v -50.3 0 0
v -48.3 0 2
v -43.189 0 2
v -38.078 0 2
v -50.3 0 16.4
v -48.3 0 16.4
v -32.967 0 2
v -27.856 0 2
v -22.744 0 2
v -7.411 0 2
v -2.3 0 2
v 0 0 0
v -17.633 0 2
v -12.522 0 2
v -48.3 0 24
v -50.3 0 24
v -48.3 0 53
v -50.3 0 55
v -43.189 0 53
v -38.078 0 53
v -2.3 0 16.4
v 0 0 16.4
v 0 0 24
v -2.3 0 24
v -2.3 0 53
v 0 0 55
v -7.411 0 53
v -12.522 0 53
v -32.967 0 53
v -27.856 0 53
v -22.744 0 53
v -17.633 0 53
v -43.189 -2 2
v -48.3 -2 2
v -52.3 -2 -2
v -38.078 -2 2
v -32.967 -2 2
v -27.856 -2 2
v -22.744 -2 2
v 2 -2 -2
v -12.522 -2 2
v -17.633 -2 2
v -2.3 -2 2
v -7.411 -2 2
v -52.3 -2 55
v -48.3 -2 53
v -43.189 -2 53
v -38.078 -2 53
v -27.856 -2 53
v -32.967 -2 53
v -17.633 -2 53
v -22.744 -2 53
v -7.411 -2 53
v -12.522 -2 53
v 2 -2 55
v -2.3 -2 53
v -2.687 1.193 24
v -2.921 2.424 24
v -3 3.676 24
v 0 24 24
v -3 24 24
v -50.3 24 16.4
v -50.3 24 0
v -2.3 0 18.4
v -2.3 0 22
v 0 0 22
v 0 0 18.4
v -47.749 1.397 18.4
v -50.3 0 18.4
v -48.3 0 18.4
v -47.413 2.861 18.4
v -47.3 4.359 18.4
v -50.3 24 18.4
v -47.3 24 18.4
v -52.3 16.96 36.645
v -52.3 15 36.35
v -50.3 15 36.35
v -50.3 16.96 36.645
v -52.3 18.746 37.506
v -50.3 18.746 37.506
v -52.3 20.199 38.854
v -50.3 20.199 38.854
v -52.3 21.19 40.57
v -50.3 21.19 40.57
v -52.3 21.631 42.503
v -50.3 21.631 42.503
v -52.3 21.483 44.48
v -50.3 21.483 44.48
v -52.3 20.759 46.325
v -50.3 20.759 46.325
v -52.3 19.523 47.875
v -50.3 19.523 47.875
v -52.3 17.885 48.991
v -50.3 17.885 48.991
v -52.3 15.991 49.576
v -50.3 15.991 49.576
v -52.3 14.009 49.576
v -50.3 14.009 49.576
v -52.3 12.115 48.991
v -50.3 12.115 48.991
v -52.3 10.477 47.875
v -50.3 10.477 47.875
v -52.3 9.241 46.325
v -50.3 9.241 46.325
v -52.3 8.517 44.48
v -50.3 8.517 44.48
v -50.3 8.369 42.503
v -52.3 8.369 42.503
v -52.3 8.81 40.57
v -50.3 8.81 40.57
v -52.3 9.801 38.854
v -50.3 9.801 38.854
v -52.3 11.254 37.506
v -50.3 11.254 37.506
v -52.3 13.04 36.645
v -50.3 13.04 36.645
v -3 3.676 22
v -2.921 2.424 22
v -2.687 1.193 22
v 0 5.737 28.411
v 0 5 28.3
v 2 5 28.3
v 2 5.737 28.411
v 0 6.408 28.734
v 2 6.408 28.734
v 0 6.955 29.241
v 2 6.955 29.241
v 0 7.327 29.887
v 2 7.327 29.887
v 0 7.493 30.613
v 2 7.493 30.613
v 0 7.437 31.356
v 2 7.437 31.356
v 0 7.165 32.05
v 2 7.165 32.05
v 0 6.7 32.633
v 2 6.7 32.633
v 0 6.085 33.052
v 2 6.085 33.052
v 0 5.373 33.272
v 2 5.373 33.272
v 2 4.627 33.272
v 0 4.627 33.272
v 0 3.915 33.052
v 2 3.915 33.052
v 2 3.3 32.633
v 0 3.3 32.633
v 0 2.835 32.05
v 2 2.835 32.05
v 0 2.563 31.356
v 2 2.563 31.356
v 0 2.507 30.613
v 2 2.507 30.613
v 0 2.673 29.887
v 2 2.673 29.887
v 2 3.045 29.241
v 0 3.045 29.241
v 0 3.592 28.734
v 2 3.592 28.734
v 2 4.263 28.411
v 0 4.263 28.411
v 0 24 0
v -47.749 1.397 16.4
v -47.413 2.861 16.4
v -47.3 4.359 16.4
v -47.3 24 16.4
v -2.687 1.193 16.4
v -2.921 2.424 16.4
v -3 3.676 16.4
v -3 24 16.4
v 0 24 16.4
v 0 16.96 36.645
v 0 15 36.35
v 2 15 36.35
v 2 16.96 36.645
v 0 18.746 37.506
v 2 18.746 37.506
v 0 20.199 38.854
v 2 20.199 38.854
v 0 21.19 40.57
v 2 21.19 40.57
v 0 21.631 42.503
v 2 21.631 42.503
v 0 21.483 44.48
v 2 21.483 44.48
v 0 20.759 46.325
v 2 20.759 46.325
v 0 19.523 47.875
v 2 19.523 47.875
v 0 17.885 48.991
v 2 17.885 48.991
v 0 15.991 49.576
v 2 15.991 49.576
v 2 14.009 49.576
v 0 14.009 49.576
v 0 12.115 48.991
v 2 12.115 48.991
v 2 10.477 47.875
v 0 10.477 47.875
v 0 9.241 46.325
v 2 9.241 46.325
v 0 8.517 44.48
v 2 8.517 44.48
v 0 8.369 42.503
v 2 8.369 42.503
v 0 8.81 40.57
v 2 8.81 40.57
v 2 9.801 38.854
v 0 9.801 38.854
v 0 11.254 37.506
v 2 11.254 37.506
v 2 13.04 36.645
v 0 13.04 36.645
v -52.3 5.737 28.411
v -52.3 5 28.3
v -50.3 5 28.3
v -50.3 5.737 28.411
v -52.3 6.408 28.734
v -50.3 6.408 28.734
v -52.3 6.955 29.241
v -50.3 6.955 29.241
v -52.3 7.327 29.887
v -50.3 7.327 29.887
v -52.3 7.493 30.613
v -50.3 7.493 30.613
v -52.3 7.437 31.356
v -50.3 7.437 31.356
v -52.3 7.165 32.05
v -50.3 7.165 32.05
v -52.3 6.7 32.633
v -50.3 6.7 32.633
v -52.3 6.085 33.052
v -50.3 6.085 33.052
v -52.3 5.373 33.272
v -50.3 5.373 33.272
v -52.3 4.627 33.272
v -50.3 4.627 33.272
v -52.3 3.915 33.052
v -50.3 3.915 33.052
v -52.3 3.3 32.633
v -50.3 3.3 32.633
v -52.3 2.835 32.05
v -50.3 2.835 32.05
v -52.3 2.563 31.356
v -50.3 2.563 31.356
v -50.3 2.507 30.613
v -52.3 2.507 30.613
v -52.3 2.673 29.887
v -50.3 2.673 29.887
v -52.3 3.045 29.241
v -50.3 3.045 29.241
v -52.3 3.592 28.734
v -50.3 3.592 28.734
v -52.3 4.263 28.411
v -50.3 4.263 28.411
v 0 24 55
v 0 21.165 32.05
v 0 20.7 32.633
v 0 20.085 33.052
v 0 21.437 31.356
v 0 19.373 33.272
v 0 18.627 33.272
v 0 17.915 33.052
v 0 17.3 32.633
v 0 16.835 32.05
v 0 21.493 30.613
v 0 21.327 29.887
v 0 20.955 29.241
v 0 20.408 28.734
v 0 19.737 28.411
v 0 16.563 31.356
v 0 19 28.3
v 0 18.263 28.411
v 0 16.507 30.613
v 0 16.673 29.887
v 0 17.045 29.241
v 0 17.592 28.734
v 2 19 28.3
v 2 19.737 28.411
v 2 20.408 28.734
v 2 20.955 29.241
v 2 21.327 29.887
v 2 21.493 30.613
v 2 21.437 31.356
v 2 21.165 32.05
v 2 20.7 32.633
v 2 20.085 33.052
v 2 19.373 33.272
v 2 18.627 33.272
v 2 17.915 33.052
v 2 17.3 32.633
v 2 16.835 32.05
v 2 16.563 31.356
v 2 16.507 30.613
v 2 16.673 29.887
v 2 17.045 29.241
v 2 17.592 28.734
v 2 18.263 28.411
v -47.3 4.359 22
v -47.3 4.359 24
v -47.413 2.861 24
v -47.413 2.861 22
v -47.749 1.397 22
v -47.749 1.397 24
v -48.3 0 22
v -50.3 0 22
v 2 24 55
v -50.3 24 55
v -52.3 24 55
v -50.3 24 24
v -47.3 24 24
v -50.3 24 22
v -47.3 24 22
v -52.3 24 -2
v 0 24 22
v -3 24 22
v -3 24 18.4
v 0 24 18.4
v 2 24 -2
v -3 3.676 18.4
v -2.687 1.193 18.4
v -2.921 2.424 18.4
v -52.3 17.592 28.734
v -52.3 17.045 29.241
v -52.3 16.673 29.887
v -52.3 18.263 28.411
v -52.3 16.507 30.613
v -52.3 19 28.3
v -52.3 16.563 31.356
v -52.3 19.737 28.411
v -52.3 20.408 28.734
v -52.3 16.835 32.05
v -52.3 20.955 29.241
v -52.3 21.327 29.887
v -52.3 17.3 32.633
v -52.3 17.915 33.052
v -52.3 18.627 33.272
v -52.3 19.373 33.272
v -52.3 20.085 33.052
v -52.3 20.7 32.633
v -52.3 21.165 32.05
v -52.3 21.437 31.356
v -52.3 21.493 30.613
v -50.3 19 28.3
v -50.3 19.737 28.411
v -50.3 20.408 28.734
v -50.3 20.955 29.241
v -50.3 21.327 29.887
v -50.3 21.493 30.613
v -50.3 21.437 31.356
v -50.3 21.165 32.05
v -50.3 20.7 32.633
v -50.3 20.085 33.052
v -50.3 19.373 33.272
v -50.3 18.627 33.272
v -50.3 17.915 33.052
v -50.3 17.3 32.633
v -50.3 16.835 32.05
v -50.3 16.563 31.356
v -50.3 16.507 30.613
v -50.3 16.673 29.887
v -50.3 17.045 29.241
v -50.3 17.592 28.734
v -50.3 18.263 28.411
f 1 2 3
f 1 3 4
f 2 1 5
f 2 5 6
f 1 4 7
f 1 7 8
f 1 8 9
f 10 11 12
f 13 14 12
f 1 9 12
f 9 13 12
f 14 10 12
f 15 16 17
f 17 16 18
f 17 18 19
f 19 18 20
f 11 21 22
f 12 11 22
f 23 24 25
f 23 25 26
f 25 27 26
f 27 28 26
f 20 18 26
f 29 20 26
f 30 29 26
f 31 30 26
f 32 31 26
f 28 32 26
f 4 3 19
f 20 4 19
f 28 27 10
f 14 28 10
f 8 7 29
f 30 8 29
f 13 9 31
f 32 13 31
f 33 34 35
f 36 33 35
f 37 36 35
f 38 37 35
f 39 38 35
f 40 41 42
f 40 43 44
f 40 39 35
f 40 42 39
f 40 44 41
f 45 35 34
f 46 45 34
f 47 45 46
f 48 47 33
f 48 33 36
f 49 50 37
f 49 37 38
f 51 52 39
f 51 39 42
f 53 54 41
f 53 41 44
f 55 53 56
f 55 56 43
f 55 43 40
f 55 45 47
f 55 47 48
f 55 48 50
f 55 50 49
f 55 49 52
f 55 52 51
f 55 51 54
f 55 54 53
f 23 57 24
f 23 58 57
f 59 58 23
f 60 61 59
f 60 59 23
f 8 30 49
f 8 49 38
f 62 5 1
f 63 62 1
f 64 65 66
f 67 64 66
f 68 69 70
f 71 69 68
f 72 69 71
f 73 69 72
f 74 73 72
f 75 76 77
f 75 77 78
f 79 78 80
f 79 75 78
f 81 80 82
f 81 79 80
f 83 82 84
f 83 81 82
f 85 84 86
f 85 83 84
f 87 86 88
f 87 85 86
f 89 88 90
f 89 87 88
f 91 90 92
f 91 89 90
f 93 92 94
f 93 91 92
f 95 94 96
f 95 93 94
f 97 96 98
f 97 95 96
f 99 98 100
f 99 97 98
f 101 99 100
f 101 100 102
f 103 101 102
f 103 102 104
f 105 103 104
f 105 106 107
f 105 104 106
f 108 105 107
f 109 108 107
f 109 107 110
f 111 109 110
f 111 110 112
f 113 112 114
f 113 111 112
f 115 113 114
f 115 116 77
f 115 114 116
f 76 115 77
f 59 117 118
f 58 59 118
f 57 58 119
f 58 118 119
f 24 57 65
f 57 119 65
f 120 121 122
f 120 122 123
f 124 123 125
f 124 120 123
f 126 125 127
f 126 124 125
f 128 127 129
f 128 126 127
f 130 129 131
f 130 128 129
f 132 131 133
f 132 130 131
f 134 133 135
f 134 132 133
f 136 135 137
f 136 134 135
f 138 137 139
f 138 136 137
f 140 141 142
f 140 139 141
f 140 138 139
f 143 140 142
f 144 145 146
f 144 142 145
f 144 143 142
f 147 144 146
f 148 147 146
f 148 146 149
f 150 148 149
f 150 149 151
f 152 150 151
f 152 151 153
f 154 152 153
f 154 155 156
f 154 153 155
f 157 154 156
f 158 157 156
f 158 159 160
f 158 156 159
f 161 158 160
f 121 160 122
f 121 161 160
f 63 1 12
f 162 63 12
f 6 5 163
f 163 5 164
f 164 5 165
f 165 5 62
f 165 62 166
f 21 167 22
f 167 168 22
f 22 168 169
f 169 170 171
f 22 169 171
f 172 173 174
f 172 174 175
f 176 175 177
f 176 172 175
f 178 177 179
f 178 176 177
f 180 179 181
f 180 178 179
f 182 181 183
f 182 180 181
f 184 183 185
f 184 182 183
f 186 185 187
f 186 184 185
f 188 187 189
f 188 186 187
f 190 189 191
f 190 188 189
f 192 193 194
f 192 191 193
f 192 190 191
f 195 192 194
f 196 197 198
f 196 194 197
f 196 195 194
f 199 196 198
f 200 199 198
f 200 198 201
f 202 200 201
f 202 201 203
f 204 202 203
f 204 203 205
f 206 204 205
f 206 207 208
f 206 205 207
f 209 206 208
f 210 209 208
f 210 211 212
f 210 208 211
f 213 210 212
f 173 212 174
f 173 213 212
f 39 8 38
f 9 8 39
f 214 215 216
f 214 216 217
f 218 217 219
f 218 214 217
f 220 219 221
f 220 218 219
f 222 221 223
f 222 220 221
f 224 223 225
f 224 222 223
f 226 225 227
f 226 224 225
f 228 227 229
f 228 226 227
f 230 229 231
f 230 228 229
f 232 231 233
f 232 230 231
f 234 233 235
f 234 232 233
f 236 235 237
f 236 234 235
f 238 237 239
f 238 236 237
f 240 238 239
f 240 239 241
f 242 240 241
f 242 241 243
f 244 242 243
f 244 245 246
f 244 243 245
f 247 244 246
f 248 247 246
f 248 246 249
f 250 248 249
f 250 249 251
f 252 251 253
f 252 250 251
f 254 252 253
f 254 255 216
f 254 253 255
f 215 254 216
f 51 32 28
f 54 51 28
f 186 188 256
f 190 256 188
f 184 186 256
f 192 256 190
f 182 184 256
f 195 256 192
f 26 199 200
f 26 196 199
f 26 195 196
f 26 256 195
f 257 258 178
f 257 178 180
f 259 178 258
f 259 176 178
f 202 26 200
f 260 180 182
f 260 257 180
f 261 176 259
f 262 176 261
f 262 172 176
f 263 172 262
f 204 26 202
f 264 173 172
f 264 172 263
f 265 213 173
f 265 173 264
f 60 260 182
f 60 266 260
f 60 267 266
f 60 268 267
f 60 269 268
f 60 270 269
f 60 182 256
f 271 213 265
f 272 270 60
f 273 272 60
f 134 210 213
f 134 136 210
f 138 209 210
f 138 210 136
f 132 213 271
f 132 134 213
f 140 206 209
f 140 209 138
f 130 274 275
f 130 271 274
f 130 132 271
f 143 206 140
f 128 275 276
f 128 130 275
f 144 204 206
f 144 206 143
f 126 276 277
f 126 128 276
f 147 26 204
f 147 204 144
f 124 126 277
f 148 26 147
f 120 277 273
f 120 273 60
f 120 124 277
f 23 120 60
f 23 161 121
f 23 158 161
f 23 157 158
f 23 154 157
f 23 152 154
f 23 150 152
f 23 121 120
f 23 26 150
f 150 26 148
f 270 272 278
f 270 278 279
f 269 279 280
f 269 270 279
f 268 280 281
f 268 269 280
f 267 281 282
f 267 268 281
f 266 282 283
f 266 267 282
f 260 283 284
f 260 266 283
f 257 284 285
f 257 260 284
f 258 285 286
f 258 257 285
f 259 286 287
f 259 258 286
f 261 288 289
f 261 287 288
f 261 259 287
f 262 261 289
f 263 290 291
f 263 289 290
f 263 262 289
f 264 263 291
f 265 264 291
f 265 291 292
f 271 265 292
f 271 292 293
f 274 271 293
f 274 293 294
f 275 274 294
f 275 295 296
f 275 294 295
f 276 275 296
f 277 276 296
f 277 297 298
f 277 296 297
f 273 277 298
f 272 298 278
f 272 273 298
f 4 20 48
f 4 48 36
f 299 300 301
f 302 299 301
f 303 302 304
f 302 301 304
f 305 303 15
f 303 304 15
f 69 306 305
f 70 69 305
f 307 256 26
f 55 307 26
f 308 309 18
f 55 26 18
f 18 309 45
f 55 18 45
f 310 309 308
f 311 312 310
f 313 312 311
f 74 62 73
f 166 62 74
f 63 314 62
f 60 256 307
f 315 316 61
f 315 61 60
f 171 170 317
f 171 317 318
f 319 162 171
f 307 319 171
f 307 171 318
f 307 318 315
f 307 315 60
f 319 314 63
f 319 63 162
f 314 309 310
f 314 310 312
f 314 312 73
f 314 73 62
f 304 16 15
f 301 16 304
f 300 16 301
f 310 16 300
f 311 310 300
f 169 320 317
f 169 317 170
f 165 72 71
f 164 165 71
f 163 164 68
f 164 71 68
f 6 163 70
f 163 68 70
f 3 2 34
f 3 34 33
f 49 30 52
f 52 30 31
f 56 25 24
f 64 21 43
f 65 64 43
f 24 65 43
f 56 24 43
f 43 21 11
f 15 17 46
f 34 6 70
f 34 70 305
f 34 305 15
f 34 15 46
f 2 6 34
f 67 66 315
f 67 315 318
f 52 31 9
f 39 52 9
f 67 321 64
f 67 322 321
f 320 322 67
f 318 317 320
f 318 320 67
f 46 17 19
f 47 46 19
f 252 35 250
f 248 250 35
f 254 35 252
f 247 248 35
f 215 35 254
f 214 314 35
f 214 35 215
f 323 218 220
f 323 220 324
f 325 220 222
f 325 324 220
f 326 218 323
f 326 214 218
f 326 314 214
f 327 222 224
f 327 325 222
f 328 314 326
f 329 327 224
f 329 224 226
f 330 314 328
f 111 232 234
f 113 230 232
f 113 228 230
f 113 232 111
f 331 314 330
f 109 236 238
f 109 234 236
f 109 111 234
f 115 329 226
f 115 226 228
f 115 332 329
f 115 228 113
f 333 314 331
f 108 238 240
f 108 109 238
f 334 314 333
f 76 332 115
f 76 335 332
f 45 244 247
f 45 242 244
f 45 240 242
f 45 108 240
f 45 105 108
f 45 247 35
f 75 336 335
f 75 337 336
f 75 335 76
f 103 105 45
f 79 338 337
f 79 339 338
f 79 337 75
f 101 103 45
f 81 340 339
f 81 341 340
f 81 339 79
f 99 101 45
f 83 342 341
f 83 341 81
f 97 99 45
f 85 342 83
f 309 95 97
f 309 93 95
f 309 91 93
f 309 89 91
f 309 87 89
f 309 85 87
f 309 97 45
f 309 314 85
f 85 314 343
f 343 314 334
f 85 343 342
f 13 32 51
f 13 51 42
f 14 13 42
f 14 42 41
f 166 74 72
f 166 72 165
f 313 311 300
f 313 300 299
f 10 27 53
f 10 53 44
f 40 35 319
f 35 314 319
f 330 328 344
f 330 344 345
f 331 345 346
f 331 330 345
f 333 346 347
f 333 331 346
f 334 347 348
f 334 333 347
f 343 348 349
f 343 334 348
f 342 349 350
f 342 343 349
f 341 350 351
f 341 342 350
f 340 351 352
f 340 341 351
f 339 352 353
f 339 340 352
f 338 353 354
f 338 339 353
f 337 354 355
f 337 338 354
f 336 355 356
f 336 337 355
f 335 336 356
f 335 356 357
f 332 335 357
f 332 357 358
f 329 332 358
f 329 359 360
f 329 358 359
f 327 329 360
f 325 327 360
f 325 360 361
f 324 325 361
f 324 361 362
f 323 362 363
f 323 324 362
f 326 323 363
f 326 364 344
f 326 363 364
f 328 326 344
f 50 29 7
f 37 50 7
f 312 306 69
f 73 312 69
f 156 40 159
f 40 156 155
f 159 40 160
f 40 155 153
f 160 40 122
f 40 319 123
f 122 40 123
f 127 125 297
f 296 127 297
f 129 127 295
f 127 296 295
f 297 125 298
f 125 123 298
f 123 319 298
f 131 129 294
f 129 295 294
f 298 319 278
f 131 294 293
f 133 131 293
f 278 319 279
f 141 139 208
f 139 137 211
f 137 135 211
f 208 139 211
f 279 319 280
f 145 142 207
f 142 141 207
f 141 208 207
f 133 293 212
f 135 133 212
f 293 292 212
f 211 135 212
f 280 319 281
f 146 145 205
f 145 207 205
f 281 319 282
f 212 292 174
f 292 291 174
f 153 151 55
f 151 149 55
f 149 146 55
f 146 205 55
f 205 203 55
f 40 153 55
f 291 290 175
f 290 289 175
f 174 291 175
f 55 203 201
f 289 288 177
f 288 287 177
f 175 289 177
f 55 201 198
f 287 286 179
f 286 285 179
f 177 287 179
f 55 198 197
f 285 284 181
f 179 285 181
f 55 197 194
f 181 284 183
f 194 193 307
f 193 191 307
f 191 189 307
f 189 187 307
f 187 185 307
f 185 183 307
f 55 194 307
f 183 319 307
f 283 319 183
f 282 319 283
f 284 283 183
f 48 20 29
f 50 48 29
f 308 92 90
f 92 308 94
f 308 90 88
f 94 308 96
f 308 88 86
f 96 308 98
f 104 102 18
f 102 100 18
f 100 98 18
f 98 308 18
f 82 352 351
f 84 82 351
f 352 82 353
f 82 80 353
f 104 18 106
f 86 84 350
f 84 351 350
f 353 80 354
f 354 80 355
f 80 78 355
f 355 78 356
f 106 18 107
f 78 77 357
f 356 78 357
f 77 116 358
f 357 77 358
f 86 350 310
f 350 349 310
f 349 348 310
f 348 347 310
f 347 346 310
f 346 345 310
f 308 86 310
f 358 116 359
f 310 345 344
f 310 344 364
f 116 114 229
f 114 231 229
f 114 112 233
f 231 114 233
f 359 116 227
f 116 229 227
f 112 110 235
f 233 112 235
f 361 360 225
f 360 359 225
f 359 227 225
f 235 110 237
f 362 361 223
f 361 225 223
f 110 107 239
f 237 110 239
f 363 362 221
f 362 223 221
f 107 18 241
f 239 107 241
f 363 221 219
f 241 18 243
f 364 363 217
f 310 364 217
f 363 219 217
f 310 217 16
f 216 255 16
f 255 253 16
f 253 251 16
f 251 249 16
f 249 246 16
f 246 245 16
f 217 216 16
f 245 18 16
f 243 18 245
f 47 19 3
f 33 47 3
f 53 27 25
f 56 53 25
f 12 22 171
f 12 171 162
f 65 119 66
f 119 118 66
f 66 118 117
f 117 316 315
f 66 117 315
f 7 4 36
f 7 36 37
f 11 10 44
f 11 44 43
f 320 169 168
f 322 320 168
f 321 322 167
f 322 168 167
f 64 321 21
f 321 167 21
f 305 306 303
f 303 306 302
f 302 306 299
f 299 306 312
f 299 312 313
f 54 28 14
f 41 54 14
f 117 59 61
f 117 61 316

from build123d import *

# Parameters (mm, degrees)
CROQUIS1_W                 = 54.3
CROQUIS1_H                 = 59
CROQUIS1_W_2               = 50.3
CROQUIS1_H_2               = 55
SALIENTE_EXTRUIR1_DEPTH    = 24
CROQUIS2_W                 = 54.3
CROQUIS2_H                 = 59
SALIENTE_EXTRUIR2_DEPTH    = 2
CORTAR_EXTRUIR4_DEPTH      = 54.3
CORTAR_EXTRUIR5_REACH      = 81.601
CROQUIS7_W                 = 5.111111111
CROQUIS7_H                 = 51
CROQUIS7_W_2               = 5.111111112
CORTAR_EXTRUIR6_DEPTH      = 66.864425147
CORTAR_EXTRUIR6_DEPTH_BACK = 66.864425147
CROQUIS8_R                 = 6.65
CORTAR_EXTRUIR7_DEPTH      = 66.864425147
CORTAR_EXTRUIR7_DEPTH_BACK = 66.864425147
CROQUIS9_R                 = 2.5
CROQUIS10_W                = 3
CROQUIS10_H                = 2
SALIENTE_EXTRUIR3_DEPTH    = 24
REDONDEO1_R                = 10


with BuildPart() as part:
    # Croquis1 → Saliente-Extruir1 (new body)
    with BuildSketch(Plane(origin=(0, 0, 0), x_dir=(1, 0, 0), z_dir=(0, 1, 0))):
        with Locations((-25.15, -27.5)):
            Rectangle(CROQUIS1_W, CROQUIS1_H)
        with Locations((-25.15, -27.5)):
            Rectangle(CROQUIS1_W_2, CROQUIS1_H_2, mode=Mode.SUBTRACT)
    extrude(amount=SALIENTE_EXTRUIR1_DEPTH)

    # Croquis2 → Saliente-Extruir2 (add)
    with BuildSketch(Plane.XZ):
        with Locations((-25.15, 27.5)):
            Rectangle(CROQUIS2_W, CROQUIS2_H)
    extrude(amount=SALIENTE_EXTRUIR2_DEPTH)

    # Croquis6 → Cortar-Extruir4 (cut)
    with BuildSketch(Plane.ZY.offset(52.3)):
        Polygon((55, 24), (55, 0), (55, -2), (57, -2), (57, 24), align=None)
    extrude(amount=-CORTAR_EXTRUIR4_DEPTH, mode=Mode.SUBTRACT)

    # Croquis7 → Cortar-Extruir5 (cut, up to next)
    with BuildSketch(Plane(origin=(0, 0, 0), x_dir=(1, 0, 0), z_dir=(0, 1, 0)), mode=Mode.PRIVATE) as cortar_extruir5_sk1:
        with Locations((-45.744444445, -27.5)):
            Rectangle(CROQUIS7_W, CROQUIS7_H)
    cortar_extruir5_tool1 = extrude(cortar_extruir5_sk1.sketch, amount=-CORTAR_EXTRUIR5_REACH, mode=Mode.PRIVATE) & part.part
    # Croquis7 → Cortar-Extruir5 (cut, up to next)
    with BuildSketch(Plane(origin=(0, 0, 0), x_dir=(1, 0, 0), z_dir=(0, 1, 0)), mode=Mode.PRIVATE) as cortar_extruir5_sk2:
        with Locations((-35.522222223, -27.5)):
            Rectangle(CROQUIS7_W, CROQUIS7_H)
    cortar_extruir5_tool2 = extrude(cortar_extruir5_sk2.sketch, amount=-CORTAR_EXTRUIR5_REACH, mode=Mode.PRIVATE) & part.part
    # Croquis7 → Cortar-Extruir5 (cut, up to next)
    with BuildSketch(Plane(origin=(0, 0, 0), x_dir=(1, 0, 0), z_dir=(0, 1, 0)), mode=Mode.PRIVATE) as cortar_extruir5_sk3:
        with Locations((-25.3, -27.5)):
            Rectangle(CROQUIS7_W_2, CROQUIS7_H)
    cortar_extruir5_tool3 = extrude(cortar_extruir5_sk3.sketch, amount=-CORTAR_EXTRUIR5_REACH, mode=Mode.PRIVATE) & part.part
    # Croquis7 → Cortar-Extruir5 (cut, up to next)
    with BuildSketch(Plane(origin=(0, 0, 0), x_dir=(1, 0, 0), z_dir=(0, 1, 0)), mode=Mode.PRIVATE) as cortar_extruir5_sk4:
        with Locations((-15.077777777, -27.5)):
            Rectangle(CROQUIS7_W, CROQUIS7_H)
    cortar_extruir5_tool4 = extrude(cortar_extruir5_sk4.sketch, amount=-CORTAR_EXTRUIR5_REACH, mode=Mode.PRIVATE) & part.part
    # Croquis7 → Cortar-Extruir5 (cut, up to next)
    with BuildSketch(Plane(origin=(0, 0, 0), x_dir=(1, 0, 0), z_dir=(0, 1, 0)), mode=Mode.PRIVATE) as cortar_extruir5_sk5:
        with Locations((-4.855555556, -27.5)):
            Rectangle(CROQUIS7_W, CROQUIS7_H)
    cortar_extruir5_tool5 = extrude(cortar_extruir5_sk5.sketch, amount=-CORTAR_EXTRUIR5_REACH, mode=Mode.PRIVATE) & part.part
    add(cortar_extruir5_tool1.solids().sort_by_distance((-45.744444, 0, 27.5))[0], mode=Mode.SUBTRACT)
    add(cortar_extruir5_tool2.solids().sort_by_distance((-35.522222, 0, 27.5))[0], mode=Mode.SUBTRACT)
    add(cortar_extruir5_tool3.solids().sort_by_distance((-25.3, 0, 27.5))[0], mode=Mode.SUBTRACT)
    add(cortar_extruir5_tool4.solids().sort_by_distance((-15.077778, 0, 27.5))[0], mode=Mode.SUBTRACT)
    add(cortar_extruir5_tool5.solids().sort_by_distance((-4.855556, 0, 27.5))[0], mode=Mode.SUBTRACT)

    # Croquis8 → Cortar-Extruir6 (cut, two sides: drawn at the far end of the back side and taken through both)
    with BuildSketch(Plane(origin=(-25.15, 0, 0), x_dir=(0, 0, -1), z_dir=(1, 0, 0)).offset(-CORTAR_EXTRUIR6_DEPTH_BACK)):
        with Locations((-43, 15)):
            Circle(CROQUIS8_R)
    extrude(amount=CORTAR_EXTRUIR6_DEPTH + CORTAR_EXTRUIR6_DEPTH_BACK, mode=Mode.SUBTRACT)

    # Croquis9 → Cortar-Extruir7 (cut, two sides: drawn at the far end of the back side and taken through both)
    with BuildSketch(Plane(origin=(-25.15, 0, 0), x_dir=(0, 0, -1), z_dir=(1, 0, 0)).offset(-CORTAR_EXTRUIR7_DEPTH_BACK)):
        with Locations((-30.8, 19)):
            Circle(CROQUIS9_R)
        with Locations((-30.8, 5)):
            Circle(CROQUIS9_R)
    extrude(amount=CORTAR_EXTRUIR7_DEPTH + CORTAR_EXTRUIR7_DEPTH_BACK, mode=Mode.SUBTRACT)

    # Croquis10 → Saliente-Extruir3 (add)
    with BuildSketch(Plane(origin=(0, 24, 0), x_dir=(1, 0, 0), z_dir=(0, 1, 0))):
        with Locations((-48.8, -17.4)):
            Rectangle(CROQUIS10_W, CROQUIS10_H)
        with Locations((-48.8, -23)):
            Rectangle(CROQUIS10_W, CROQUIS10_H)
        with Locations((-1.5, -23)):
            Rectangle(CROQUIS10_W, CROQUIS10_H)
        with Locations((-1.5, -17.4)):
            Rectangle(CROQUIS10_W, CROQUIS10_H)
    extrude(amount=-SALIENTE_EXTRUIR3_DEPTH)

    # Redondeo1
    # the kernel refuses this fillet: 10 mm, written as the material it takes off along each edge
    with BuildSketch(Plane(origin=(-3, 0, 7.211012025), x_dir=(0, 1, 0), z_dir=(0, 0, 1)), Plane(origin=(-3, 0, 12.811012025), x_dir=(0, 1, 0), z_dir=(0, 0, 1))) as redondeo1_piece_1:
        with BuildLine():
            CenterArc((3.67559519, -10), REDONDEO1_R, 90, 21.565185015)
            Line((0, -0.7), (-0.073511904, -0.514))
            ThreePointArc((-0.073511904, -0.514), (-0.2, -0.35), (-0.2, 0))
            Line((-0.2, 0), (0, 0.2))
            Line((0, 0.2), (3.67559519, 0.2))
            Line((3.67559519, 0.2), (3.67559519, 0))
        make_face()
    extrude(amount=20.377975949, mode=Mode.SUBTRACT)
    with BuildSketch(Plane(origin=(-47.3, 0, 29.297247359), x_dir=(0, 1, 0), z_dir=(0, 0, -1)), Plane(origin=(-47.3, 0, 34.897247359), x_dir=(0, 1, 0), z_dir=(0, 0, -1))) as redondeo1_piece_2:
        with BuildLine():
            CenterArc((4.358898944, -10), REDONDEO1_R, 90, 25.841932763)
            Line((0, -1), (-0.087177979, -0.82))
            ThreePointArc((-0.087177979, -0.82), (-0.2, -0.5), (-0.2, 0))
            Line((-0.2, 0), (0, 0.2))
            Line((0, 0.2), (4.358898944, 0.2))
            Line((4.358898944, 0.2), (4.358898944, 0))
        make_face()
    extrude(amount=23.794494718, mode=Mode.SUBTRACT)


solid = part.part
